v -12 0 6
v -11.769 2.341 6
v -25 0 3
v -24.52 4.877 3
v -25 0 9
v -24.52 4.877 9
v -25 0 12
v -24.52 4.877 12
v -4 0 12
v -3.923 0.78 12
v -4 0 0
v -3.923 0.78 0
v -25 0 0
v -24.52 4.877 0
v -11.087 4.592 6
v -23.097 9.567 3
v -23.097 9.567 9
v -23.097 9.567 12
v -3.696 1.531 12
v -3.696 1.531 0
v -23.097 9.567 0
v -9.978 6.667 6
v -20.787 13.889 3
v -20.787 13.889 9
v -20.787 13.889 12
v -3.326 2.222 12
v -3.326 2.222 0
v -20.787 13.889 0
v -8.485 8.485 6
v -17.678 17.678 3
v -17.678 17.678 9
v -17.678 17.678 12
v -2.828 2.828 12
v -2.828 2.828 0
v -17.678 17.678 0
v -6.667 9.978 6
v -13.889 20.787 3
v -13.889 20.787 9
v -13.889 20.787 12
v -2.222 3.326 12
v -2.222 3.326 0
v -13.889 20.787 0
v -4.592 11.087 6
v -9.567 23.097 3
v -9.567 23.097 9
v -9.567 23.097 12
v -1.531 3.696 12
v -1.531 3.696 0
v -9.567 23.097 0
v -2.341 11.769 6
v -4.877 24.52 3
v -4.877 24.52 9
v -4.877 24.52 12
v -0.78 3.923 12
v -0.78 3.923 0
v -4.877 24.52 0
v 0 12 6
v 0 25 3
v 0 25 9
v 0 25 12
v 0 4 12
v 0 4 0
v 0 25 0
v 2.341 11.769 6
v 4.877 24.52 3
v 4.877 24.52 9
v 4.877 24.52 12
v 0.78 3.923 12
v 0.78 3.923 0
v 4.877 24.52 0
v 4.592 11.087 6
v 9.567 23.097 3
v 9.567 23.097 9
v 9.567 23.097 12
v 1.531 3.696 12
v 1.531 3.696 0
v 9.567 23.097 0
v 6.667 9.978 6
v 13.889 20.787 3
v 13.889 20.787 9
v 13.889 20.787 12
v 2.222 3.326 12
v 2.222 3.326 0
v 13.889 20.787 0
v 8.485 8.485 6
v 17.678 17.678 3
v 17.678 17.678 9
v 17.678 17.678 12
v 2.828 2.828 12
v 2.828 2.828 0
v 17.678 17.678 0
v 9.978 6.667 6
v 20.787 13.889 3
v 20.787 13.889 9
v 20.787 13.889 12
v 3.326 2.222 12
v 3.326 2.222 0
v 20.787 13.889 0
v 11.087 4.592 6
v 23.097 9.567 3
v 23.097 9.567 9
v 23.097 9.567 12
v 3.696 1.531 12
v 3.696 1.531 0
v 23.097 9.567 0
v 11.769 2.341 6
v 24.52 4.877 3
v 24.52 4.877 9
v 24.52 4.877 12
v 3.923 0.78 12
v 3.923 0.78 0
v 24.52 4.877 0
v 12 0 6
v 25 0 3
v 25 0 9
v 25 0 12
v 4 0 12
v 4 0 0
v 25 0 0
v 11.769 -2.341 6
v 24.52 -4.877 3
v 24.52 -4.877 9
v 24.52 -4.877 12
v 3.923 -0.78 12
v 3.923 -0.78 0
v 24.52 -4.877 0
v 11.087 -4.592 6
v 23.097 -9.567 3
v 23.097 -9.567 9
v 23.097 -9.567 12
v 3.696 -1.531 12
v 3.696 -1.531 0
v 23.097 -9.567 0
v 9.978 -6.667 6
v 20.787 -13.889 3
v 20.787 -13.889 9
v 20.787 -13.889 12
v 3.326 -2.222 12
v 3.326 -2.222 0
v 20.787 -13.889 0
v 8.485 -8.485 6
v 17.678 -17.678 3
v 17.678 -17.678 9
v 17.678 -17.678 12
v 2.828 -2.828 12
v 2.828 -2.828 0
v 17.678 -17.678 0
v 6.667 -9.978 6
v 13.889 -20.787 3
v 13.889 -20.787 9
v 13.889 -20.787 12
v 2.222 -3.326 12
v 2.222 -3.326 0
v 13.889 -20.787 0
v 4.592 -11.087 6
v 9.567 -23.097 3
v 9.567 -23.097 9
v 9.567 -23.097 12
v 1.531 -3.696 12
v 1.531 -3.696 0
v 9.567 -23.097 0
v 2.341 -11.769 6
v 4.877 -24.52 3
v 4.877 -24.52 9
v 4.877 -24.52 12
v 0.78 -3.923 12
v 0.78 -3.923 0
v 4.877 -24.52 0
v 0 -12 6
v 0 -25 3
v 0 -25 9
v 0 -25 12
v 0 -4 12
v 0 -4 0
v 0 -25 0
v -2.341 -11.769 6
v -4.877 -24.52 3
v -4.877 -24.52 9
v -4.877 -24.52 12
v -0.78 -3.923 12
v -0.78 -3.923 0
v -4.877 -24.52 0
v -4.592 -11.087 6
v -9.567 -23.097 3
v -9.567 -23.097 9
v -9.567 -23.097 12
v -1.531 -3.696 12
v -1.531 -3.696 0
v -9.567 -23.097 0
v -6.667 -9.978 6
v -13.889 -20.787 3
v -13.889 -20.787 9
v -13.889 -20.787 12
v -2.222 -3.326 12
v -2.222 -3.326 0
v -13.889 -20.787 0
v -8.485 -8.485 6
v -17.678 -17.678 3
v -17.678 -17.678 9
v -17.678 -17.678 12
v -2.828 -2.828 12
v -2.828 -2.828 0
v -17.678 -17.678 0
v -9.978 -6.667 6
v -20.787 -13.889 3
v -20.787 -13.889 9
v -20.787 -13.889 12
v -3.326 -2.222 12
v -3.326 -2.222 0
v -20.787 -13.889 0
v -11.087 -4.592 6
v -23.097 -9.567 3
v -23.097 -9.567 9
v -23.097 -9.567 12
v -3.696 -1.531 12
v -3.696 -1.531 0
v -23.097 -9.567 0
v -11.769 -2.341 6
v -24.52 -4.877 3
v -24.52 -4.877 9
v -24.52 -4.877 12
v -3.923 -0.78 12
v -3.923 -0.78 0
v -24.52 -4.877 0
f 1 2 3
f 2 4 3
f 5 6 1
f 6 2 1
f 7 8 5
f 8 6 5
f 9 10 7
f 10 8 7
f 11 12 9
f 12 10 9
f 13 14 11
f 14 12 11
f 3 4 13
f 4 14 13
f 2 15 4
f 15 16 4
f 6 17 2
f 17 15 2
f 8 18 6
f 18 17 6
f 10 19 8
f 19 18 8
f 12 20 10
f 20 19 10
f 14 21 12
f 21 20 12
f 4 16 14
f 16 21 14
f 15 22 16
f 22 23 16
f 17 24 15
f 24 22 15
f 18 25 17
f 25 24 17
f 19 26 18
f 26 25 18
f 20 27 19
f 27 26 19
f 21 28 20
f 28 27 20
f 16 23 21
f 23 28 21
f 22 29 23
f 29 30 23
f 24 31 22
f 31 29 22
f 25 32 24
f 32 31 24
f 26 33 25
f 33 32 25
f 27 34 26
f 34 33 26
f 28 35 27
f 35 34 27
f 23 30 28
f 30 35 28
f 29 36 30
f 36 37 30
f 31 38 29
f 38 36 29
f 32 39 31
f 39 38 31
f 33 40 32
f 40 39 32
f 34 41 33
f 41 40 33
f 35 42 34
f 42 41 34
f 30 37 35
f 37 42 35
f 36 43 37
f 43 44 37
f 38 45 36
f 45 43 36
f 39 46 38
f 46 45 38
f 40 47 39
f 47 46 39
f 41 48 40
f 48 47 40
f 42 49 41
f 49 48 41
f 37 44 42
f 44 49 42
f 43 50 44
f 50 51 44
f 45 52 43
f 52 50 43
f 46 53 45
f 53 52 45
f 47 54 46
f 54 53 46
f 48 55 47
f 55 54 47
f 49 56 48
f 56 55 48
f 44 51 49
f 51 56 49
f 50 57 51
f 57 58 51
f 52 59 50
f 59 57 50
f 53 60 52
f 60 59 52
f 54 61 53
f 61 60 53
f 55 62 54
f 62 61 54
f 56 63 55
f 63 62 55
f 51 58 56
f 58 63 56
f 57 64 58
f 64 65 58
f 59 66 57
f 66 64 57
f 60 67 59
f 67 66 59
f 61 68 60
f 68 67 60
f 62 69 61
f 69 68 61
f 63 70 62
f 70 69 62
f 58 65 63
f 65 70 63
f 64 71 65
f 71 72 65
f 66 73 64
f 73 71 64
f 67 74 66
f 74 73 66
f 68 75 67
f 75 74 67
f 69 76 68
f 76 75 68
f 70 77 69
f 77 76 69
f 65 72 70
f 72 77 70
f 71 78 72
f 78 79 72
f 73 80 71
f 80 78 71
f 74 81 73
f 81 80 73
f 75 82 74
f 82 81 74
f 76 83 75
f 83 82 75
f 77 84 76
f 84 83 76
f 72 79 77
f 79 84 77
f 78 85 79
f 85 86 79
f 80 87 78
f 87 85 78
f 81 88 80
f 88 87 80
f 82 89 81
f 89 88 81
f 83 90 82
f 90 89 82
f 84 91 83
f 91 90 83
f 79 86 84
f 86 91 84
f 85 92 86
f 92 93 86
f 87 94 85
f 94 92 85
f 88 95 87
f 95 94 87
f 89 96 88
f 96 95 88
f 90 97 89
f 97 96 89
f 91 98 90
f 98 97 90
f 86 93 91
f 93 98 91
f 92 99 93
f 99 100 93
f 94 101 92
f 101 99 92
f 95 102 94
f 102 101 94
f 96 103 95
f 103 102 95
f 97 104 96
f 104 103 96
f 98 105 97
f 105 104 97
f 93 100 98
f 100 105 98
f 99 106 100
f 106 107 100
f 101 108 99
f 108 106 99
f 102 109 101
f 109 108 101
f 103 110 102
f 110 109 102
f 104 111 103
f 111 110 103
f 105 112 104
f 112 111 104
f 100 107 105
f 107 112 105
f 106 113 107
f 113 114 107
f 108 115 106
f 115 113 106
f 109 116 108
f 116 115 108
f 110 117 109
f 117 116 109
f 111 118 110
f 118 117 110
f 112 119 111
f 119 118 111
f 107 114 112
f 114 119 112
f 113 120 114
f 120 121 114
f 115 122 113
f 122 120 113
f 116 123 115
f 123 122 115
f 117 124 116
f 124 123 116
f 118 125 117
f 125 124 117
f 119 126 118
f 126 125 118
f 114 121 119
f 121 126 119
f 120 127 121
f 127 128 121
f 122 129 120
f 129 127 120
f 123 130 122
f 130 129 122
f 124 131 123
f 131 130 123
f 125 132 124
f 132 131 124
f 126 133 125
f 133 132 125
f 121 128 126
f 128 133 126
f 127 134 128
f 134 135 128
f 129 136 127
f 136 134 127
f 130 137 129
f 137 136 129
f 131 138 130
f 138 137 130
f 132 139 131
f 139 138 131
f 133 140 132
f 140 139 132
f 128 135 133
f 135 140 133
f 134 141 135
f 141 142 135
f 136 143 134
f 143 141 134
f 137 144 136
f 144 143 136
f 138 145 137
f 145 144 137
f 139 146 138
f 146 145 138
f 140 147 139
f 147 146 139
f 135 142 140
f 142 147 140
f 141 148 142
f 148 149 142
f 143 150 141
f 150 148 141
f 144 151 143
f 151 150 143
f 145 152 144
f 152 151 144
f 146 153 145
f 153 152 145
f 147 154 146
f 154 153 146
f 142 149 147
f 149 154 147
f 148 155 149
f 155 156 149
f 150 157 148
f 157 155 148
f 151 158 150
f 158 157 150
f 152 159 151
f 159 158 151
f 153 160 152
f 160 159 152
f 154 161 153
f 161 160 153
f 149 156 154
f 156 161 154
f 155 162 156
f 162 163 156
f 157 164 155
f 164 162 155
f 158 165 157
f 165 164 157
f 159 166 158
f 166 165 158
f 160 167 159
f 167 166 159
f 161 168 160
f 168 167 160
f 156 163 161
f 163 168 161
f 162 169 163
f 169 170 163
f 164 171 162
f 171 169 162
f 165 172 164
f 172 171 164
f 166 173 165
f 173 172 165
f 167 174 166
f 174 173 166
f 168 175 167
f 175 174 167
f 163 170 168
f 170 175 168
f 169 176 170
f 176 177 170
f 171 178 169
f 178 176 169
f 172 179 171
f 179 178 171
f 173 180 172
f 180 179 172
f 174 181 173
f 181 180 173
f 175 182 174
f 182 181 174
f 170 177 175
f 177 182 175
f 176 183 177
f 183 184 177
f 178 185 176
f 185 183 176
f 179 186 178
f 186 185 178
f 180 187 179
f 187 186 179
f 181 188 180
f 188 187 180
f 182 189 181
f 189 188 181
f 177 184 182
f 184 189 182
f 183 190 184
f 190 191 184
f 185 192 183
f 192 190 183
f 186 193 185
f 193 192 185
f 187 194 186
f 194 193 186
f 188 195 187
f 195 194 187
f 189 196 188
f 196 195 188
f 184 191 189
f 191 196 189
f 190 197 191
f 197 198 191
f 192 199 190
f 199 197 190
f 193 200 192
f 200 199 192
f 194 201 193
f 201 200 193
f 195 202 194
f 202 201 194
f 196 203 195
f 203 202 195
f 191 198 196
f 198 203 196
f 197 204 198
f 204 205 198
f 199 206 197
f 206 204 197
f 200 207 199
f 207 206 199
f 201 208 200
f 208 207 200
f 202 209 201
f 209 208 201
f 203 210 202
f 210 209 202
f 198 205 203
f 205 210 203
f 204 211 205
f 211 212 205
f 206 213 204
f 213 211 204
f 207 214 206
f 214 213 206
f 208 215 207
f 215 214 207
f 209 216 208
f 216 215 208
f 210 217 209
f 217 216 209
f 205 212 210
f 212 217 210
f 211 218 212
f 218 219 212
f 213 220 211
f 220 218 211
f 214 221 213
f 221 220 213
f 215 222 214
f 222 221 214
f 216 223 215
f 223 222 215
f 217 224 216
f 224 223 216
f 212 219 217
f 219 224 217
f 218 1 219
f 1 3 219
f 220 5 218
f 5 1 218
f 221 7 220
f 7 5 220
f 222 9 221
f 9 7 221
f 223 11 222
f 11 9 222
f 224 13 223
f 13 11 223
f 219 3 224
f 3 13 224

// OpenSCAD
$fn = 32;

// ----------------------------------------------------------------------
// Revolved part: V-groove pulley R25
// ----------------------------------------------------------------------

// --- parameters (mm) ---
bore_r = 4;               // bore radius
rim_r = 25;               // rim radius
rim_t = 12;               // rim width
groove_r = 12;            // groove root radius
groove_w = 3;             // groove half width
revolve_angle = 360;      // revolve sweep, degrees

bore_d = 2 * bore_r;
rim_d = 2 * rim_r;
groove_d = 2 * groove_r;

profile = [[4, 0], [25, 0], [25, 3], [12, 6], [25, 9], [25, 12], [4, 12]];  // primary outline, 7 points, counter clockwise

// --- the one profile operation ---
rotate_extrude(angle = revolve_angle) polygon(points = profile);
